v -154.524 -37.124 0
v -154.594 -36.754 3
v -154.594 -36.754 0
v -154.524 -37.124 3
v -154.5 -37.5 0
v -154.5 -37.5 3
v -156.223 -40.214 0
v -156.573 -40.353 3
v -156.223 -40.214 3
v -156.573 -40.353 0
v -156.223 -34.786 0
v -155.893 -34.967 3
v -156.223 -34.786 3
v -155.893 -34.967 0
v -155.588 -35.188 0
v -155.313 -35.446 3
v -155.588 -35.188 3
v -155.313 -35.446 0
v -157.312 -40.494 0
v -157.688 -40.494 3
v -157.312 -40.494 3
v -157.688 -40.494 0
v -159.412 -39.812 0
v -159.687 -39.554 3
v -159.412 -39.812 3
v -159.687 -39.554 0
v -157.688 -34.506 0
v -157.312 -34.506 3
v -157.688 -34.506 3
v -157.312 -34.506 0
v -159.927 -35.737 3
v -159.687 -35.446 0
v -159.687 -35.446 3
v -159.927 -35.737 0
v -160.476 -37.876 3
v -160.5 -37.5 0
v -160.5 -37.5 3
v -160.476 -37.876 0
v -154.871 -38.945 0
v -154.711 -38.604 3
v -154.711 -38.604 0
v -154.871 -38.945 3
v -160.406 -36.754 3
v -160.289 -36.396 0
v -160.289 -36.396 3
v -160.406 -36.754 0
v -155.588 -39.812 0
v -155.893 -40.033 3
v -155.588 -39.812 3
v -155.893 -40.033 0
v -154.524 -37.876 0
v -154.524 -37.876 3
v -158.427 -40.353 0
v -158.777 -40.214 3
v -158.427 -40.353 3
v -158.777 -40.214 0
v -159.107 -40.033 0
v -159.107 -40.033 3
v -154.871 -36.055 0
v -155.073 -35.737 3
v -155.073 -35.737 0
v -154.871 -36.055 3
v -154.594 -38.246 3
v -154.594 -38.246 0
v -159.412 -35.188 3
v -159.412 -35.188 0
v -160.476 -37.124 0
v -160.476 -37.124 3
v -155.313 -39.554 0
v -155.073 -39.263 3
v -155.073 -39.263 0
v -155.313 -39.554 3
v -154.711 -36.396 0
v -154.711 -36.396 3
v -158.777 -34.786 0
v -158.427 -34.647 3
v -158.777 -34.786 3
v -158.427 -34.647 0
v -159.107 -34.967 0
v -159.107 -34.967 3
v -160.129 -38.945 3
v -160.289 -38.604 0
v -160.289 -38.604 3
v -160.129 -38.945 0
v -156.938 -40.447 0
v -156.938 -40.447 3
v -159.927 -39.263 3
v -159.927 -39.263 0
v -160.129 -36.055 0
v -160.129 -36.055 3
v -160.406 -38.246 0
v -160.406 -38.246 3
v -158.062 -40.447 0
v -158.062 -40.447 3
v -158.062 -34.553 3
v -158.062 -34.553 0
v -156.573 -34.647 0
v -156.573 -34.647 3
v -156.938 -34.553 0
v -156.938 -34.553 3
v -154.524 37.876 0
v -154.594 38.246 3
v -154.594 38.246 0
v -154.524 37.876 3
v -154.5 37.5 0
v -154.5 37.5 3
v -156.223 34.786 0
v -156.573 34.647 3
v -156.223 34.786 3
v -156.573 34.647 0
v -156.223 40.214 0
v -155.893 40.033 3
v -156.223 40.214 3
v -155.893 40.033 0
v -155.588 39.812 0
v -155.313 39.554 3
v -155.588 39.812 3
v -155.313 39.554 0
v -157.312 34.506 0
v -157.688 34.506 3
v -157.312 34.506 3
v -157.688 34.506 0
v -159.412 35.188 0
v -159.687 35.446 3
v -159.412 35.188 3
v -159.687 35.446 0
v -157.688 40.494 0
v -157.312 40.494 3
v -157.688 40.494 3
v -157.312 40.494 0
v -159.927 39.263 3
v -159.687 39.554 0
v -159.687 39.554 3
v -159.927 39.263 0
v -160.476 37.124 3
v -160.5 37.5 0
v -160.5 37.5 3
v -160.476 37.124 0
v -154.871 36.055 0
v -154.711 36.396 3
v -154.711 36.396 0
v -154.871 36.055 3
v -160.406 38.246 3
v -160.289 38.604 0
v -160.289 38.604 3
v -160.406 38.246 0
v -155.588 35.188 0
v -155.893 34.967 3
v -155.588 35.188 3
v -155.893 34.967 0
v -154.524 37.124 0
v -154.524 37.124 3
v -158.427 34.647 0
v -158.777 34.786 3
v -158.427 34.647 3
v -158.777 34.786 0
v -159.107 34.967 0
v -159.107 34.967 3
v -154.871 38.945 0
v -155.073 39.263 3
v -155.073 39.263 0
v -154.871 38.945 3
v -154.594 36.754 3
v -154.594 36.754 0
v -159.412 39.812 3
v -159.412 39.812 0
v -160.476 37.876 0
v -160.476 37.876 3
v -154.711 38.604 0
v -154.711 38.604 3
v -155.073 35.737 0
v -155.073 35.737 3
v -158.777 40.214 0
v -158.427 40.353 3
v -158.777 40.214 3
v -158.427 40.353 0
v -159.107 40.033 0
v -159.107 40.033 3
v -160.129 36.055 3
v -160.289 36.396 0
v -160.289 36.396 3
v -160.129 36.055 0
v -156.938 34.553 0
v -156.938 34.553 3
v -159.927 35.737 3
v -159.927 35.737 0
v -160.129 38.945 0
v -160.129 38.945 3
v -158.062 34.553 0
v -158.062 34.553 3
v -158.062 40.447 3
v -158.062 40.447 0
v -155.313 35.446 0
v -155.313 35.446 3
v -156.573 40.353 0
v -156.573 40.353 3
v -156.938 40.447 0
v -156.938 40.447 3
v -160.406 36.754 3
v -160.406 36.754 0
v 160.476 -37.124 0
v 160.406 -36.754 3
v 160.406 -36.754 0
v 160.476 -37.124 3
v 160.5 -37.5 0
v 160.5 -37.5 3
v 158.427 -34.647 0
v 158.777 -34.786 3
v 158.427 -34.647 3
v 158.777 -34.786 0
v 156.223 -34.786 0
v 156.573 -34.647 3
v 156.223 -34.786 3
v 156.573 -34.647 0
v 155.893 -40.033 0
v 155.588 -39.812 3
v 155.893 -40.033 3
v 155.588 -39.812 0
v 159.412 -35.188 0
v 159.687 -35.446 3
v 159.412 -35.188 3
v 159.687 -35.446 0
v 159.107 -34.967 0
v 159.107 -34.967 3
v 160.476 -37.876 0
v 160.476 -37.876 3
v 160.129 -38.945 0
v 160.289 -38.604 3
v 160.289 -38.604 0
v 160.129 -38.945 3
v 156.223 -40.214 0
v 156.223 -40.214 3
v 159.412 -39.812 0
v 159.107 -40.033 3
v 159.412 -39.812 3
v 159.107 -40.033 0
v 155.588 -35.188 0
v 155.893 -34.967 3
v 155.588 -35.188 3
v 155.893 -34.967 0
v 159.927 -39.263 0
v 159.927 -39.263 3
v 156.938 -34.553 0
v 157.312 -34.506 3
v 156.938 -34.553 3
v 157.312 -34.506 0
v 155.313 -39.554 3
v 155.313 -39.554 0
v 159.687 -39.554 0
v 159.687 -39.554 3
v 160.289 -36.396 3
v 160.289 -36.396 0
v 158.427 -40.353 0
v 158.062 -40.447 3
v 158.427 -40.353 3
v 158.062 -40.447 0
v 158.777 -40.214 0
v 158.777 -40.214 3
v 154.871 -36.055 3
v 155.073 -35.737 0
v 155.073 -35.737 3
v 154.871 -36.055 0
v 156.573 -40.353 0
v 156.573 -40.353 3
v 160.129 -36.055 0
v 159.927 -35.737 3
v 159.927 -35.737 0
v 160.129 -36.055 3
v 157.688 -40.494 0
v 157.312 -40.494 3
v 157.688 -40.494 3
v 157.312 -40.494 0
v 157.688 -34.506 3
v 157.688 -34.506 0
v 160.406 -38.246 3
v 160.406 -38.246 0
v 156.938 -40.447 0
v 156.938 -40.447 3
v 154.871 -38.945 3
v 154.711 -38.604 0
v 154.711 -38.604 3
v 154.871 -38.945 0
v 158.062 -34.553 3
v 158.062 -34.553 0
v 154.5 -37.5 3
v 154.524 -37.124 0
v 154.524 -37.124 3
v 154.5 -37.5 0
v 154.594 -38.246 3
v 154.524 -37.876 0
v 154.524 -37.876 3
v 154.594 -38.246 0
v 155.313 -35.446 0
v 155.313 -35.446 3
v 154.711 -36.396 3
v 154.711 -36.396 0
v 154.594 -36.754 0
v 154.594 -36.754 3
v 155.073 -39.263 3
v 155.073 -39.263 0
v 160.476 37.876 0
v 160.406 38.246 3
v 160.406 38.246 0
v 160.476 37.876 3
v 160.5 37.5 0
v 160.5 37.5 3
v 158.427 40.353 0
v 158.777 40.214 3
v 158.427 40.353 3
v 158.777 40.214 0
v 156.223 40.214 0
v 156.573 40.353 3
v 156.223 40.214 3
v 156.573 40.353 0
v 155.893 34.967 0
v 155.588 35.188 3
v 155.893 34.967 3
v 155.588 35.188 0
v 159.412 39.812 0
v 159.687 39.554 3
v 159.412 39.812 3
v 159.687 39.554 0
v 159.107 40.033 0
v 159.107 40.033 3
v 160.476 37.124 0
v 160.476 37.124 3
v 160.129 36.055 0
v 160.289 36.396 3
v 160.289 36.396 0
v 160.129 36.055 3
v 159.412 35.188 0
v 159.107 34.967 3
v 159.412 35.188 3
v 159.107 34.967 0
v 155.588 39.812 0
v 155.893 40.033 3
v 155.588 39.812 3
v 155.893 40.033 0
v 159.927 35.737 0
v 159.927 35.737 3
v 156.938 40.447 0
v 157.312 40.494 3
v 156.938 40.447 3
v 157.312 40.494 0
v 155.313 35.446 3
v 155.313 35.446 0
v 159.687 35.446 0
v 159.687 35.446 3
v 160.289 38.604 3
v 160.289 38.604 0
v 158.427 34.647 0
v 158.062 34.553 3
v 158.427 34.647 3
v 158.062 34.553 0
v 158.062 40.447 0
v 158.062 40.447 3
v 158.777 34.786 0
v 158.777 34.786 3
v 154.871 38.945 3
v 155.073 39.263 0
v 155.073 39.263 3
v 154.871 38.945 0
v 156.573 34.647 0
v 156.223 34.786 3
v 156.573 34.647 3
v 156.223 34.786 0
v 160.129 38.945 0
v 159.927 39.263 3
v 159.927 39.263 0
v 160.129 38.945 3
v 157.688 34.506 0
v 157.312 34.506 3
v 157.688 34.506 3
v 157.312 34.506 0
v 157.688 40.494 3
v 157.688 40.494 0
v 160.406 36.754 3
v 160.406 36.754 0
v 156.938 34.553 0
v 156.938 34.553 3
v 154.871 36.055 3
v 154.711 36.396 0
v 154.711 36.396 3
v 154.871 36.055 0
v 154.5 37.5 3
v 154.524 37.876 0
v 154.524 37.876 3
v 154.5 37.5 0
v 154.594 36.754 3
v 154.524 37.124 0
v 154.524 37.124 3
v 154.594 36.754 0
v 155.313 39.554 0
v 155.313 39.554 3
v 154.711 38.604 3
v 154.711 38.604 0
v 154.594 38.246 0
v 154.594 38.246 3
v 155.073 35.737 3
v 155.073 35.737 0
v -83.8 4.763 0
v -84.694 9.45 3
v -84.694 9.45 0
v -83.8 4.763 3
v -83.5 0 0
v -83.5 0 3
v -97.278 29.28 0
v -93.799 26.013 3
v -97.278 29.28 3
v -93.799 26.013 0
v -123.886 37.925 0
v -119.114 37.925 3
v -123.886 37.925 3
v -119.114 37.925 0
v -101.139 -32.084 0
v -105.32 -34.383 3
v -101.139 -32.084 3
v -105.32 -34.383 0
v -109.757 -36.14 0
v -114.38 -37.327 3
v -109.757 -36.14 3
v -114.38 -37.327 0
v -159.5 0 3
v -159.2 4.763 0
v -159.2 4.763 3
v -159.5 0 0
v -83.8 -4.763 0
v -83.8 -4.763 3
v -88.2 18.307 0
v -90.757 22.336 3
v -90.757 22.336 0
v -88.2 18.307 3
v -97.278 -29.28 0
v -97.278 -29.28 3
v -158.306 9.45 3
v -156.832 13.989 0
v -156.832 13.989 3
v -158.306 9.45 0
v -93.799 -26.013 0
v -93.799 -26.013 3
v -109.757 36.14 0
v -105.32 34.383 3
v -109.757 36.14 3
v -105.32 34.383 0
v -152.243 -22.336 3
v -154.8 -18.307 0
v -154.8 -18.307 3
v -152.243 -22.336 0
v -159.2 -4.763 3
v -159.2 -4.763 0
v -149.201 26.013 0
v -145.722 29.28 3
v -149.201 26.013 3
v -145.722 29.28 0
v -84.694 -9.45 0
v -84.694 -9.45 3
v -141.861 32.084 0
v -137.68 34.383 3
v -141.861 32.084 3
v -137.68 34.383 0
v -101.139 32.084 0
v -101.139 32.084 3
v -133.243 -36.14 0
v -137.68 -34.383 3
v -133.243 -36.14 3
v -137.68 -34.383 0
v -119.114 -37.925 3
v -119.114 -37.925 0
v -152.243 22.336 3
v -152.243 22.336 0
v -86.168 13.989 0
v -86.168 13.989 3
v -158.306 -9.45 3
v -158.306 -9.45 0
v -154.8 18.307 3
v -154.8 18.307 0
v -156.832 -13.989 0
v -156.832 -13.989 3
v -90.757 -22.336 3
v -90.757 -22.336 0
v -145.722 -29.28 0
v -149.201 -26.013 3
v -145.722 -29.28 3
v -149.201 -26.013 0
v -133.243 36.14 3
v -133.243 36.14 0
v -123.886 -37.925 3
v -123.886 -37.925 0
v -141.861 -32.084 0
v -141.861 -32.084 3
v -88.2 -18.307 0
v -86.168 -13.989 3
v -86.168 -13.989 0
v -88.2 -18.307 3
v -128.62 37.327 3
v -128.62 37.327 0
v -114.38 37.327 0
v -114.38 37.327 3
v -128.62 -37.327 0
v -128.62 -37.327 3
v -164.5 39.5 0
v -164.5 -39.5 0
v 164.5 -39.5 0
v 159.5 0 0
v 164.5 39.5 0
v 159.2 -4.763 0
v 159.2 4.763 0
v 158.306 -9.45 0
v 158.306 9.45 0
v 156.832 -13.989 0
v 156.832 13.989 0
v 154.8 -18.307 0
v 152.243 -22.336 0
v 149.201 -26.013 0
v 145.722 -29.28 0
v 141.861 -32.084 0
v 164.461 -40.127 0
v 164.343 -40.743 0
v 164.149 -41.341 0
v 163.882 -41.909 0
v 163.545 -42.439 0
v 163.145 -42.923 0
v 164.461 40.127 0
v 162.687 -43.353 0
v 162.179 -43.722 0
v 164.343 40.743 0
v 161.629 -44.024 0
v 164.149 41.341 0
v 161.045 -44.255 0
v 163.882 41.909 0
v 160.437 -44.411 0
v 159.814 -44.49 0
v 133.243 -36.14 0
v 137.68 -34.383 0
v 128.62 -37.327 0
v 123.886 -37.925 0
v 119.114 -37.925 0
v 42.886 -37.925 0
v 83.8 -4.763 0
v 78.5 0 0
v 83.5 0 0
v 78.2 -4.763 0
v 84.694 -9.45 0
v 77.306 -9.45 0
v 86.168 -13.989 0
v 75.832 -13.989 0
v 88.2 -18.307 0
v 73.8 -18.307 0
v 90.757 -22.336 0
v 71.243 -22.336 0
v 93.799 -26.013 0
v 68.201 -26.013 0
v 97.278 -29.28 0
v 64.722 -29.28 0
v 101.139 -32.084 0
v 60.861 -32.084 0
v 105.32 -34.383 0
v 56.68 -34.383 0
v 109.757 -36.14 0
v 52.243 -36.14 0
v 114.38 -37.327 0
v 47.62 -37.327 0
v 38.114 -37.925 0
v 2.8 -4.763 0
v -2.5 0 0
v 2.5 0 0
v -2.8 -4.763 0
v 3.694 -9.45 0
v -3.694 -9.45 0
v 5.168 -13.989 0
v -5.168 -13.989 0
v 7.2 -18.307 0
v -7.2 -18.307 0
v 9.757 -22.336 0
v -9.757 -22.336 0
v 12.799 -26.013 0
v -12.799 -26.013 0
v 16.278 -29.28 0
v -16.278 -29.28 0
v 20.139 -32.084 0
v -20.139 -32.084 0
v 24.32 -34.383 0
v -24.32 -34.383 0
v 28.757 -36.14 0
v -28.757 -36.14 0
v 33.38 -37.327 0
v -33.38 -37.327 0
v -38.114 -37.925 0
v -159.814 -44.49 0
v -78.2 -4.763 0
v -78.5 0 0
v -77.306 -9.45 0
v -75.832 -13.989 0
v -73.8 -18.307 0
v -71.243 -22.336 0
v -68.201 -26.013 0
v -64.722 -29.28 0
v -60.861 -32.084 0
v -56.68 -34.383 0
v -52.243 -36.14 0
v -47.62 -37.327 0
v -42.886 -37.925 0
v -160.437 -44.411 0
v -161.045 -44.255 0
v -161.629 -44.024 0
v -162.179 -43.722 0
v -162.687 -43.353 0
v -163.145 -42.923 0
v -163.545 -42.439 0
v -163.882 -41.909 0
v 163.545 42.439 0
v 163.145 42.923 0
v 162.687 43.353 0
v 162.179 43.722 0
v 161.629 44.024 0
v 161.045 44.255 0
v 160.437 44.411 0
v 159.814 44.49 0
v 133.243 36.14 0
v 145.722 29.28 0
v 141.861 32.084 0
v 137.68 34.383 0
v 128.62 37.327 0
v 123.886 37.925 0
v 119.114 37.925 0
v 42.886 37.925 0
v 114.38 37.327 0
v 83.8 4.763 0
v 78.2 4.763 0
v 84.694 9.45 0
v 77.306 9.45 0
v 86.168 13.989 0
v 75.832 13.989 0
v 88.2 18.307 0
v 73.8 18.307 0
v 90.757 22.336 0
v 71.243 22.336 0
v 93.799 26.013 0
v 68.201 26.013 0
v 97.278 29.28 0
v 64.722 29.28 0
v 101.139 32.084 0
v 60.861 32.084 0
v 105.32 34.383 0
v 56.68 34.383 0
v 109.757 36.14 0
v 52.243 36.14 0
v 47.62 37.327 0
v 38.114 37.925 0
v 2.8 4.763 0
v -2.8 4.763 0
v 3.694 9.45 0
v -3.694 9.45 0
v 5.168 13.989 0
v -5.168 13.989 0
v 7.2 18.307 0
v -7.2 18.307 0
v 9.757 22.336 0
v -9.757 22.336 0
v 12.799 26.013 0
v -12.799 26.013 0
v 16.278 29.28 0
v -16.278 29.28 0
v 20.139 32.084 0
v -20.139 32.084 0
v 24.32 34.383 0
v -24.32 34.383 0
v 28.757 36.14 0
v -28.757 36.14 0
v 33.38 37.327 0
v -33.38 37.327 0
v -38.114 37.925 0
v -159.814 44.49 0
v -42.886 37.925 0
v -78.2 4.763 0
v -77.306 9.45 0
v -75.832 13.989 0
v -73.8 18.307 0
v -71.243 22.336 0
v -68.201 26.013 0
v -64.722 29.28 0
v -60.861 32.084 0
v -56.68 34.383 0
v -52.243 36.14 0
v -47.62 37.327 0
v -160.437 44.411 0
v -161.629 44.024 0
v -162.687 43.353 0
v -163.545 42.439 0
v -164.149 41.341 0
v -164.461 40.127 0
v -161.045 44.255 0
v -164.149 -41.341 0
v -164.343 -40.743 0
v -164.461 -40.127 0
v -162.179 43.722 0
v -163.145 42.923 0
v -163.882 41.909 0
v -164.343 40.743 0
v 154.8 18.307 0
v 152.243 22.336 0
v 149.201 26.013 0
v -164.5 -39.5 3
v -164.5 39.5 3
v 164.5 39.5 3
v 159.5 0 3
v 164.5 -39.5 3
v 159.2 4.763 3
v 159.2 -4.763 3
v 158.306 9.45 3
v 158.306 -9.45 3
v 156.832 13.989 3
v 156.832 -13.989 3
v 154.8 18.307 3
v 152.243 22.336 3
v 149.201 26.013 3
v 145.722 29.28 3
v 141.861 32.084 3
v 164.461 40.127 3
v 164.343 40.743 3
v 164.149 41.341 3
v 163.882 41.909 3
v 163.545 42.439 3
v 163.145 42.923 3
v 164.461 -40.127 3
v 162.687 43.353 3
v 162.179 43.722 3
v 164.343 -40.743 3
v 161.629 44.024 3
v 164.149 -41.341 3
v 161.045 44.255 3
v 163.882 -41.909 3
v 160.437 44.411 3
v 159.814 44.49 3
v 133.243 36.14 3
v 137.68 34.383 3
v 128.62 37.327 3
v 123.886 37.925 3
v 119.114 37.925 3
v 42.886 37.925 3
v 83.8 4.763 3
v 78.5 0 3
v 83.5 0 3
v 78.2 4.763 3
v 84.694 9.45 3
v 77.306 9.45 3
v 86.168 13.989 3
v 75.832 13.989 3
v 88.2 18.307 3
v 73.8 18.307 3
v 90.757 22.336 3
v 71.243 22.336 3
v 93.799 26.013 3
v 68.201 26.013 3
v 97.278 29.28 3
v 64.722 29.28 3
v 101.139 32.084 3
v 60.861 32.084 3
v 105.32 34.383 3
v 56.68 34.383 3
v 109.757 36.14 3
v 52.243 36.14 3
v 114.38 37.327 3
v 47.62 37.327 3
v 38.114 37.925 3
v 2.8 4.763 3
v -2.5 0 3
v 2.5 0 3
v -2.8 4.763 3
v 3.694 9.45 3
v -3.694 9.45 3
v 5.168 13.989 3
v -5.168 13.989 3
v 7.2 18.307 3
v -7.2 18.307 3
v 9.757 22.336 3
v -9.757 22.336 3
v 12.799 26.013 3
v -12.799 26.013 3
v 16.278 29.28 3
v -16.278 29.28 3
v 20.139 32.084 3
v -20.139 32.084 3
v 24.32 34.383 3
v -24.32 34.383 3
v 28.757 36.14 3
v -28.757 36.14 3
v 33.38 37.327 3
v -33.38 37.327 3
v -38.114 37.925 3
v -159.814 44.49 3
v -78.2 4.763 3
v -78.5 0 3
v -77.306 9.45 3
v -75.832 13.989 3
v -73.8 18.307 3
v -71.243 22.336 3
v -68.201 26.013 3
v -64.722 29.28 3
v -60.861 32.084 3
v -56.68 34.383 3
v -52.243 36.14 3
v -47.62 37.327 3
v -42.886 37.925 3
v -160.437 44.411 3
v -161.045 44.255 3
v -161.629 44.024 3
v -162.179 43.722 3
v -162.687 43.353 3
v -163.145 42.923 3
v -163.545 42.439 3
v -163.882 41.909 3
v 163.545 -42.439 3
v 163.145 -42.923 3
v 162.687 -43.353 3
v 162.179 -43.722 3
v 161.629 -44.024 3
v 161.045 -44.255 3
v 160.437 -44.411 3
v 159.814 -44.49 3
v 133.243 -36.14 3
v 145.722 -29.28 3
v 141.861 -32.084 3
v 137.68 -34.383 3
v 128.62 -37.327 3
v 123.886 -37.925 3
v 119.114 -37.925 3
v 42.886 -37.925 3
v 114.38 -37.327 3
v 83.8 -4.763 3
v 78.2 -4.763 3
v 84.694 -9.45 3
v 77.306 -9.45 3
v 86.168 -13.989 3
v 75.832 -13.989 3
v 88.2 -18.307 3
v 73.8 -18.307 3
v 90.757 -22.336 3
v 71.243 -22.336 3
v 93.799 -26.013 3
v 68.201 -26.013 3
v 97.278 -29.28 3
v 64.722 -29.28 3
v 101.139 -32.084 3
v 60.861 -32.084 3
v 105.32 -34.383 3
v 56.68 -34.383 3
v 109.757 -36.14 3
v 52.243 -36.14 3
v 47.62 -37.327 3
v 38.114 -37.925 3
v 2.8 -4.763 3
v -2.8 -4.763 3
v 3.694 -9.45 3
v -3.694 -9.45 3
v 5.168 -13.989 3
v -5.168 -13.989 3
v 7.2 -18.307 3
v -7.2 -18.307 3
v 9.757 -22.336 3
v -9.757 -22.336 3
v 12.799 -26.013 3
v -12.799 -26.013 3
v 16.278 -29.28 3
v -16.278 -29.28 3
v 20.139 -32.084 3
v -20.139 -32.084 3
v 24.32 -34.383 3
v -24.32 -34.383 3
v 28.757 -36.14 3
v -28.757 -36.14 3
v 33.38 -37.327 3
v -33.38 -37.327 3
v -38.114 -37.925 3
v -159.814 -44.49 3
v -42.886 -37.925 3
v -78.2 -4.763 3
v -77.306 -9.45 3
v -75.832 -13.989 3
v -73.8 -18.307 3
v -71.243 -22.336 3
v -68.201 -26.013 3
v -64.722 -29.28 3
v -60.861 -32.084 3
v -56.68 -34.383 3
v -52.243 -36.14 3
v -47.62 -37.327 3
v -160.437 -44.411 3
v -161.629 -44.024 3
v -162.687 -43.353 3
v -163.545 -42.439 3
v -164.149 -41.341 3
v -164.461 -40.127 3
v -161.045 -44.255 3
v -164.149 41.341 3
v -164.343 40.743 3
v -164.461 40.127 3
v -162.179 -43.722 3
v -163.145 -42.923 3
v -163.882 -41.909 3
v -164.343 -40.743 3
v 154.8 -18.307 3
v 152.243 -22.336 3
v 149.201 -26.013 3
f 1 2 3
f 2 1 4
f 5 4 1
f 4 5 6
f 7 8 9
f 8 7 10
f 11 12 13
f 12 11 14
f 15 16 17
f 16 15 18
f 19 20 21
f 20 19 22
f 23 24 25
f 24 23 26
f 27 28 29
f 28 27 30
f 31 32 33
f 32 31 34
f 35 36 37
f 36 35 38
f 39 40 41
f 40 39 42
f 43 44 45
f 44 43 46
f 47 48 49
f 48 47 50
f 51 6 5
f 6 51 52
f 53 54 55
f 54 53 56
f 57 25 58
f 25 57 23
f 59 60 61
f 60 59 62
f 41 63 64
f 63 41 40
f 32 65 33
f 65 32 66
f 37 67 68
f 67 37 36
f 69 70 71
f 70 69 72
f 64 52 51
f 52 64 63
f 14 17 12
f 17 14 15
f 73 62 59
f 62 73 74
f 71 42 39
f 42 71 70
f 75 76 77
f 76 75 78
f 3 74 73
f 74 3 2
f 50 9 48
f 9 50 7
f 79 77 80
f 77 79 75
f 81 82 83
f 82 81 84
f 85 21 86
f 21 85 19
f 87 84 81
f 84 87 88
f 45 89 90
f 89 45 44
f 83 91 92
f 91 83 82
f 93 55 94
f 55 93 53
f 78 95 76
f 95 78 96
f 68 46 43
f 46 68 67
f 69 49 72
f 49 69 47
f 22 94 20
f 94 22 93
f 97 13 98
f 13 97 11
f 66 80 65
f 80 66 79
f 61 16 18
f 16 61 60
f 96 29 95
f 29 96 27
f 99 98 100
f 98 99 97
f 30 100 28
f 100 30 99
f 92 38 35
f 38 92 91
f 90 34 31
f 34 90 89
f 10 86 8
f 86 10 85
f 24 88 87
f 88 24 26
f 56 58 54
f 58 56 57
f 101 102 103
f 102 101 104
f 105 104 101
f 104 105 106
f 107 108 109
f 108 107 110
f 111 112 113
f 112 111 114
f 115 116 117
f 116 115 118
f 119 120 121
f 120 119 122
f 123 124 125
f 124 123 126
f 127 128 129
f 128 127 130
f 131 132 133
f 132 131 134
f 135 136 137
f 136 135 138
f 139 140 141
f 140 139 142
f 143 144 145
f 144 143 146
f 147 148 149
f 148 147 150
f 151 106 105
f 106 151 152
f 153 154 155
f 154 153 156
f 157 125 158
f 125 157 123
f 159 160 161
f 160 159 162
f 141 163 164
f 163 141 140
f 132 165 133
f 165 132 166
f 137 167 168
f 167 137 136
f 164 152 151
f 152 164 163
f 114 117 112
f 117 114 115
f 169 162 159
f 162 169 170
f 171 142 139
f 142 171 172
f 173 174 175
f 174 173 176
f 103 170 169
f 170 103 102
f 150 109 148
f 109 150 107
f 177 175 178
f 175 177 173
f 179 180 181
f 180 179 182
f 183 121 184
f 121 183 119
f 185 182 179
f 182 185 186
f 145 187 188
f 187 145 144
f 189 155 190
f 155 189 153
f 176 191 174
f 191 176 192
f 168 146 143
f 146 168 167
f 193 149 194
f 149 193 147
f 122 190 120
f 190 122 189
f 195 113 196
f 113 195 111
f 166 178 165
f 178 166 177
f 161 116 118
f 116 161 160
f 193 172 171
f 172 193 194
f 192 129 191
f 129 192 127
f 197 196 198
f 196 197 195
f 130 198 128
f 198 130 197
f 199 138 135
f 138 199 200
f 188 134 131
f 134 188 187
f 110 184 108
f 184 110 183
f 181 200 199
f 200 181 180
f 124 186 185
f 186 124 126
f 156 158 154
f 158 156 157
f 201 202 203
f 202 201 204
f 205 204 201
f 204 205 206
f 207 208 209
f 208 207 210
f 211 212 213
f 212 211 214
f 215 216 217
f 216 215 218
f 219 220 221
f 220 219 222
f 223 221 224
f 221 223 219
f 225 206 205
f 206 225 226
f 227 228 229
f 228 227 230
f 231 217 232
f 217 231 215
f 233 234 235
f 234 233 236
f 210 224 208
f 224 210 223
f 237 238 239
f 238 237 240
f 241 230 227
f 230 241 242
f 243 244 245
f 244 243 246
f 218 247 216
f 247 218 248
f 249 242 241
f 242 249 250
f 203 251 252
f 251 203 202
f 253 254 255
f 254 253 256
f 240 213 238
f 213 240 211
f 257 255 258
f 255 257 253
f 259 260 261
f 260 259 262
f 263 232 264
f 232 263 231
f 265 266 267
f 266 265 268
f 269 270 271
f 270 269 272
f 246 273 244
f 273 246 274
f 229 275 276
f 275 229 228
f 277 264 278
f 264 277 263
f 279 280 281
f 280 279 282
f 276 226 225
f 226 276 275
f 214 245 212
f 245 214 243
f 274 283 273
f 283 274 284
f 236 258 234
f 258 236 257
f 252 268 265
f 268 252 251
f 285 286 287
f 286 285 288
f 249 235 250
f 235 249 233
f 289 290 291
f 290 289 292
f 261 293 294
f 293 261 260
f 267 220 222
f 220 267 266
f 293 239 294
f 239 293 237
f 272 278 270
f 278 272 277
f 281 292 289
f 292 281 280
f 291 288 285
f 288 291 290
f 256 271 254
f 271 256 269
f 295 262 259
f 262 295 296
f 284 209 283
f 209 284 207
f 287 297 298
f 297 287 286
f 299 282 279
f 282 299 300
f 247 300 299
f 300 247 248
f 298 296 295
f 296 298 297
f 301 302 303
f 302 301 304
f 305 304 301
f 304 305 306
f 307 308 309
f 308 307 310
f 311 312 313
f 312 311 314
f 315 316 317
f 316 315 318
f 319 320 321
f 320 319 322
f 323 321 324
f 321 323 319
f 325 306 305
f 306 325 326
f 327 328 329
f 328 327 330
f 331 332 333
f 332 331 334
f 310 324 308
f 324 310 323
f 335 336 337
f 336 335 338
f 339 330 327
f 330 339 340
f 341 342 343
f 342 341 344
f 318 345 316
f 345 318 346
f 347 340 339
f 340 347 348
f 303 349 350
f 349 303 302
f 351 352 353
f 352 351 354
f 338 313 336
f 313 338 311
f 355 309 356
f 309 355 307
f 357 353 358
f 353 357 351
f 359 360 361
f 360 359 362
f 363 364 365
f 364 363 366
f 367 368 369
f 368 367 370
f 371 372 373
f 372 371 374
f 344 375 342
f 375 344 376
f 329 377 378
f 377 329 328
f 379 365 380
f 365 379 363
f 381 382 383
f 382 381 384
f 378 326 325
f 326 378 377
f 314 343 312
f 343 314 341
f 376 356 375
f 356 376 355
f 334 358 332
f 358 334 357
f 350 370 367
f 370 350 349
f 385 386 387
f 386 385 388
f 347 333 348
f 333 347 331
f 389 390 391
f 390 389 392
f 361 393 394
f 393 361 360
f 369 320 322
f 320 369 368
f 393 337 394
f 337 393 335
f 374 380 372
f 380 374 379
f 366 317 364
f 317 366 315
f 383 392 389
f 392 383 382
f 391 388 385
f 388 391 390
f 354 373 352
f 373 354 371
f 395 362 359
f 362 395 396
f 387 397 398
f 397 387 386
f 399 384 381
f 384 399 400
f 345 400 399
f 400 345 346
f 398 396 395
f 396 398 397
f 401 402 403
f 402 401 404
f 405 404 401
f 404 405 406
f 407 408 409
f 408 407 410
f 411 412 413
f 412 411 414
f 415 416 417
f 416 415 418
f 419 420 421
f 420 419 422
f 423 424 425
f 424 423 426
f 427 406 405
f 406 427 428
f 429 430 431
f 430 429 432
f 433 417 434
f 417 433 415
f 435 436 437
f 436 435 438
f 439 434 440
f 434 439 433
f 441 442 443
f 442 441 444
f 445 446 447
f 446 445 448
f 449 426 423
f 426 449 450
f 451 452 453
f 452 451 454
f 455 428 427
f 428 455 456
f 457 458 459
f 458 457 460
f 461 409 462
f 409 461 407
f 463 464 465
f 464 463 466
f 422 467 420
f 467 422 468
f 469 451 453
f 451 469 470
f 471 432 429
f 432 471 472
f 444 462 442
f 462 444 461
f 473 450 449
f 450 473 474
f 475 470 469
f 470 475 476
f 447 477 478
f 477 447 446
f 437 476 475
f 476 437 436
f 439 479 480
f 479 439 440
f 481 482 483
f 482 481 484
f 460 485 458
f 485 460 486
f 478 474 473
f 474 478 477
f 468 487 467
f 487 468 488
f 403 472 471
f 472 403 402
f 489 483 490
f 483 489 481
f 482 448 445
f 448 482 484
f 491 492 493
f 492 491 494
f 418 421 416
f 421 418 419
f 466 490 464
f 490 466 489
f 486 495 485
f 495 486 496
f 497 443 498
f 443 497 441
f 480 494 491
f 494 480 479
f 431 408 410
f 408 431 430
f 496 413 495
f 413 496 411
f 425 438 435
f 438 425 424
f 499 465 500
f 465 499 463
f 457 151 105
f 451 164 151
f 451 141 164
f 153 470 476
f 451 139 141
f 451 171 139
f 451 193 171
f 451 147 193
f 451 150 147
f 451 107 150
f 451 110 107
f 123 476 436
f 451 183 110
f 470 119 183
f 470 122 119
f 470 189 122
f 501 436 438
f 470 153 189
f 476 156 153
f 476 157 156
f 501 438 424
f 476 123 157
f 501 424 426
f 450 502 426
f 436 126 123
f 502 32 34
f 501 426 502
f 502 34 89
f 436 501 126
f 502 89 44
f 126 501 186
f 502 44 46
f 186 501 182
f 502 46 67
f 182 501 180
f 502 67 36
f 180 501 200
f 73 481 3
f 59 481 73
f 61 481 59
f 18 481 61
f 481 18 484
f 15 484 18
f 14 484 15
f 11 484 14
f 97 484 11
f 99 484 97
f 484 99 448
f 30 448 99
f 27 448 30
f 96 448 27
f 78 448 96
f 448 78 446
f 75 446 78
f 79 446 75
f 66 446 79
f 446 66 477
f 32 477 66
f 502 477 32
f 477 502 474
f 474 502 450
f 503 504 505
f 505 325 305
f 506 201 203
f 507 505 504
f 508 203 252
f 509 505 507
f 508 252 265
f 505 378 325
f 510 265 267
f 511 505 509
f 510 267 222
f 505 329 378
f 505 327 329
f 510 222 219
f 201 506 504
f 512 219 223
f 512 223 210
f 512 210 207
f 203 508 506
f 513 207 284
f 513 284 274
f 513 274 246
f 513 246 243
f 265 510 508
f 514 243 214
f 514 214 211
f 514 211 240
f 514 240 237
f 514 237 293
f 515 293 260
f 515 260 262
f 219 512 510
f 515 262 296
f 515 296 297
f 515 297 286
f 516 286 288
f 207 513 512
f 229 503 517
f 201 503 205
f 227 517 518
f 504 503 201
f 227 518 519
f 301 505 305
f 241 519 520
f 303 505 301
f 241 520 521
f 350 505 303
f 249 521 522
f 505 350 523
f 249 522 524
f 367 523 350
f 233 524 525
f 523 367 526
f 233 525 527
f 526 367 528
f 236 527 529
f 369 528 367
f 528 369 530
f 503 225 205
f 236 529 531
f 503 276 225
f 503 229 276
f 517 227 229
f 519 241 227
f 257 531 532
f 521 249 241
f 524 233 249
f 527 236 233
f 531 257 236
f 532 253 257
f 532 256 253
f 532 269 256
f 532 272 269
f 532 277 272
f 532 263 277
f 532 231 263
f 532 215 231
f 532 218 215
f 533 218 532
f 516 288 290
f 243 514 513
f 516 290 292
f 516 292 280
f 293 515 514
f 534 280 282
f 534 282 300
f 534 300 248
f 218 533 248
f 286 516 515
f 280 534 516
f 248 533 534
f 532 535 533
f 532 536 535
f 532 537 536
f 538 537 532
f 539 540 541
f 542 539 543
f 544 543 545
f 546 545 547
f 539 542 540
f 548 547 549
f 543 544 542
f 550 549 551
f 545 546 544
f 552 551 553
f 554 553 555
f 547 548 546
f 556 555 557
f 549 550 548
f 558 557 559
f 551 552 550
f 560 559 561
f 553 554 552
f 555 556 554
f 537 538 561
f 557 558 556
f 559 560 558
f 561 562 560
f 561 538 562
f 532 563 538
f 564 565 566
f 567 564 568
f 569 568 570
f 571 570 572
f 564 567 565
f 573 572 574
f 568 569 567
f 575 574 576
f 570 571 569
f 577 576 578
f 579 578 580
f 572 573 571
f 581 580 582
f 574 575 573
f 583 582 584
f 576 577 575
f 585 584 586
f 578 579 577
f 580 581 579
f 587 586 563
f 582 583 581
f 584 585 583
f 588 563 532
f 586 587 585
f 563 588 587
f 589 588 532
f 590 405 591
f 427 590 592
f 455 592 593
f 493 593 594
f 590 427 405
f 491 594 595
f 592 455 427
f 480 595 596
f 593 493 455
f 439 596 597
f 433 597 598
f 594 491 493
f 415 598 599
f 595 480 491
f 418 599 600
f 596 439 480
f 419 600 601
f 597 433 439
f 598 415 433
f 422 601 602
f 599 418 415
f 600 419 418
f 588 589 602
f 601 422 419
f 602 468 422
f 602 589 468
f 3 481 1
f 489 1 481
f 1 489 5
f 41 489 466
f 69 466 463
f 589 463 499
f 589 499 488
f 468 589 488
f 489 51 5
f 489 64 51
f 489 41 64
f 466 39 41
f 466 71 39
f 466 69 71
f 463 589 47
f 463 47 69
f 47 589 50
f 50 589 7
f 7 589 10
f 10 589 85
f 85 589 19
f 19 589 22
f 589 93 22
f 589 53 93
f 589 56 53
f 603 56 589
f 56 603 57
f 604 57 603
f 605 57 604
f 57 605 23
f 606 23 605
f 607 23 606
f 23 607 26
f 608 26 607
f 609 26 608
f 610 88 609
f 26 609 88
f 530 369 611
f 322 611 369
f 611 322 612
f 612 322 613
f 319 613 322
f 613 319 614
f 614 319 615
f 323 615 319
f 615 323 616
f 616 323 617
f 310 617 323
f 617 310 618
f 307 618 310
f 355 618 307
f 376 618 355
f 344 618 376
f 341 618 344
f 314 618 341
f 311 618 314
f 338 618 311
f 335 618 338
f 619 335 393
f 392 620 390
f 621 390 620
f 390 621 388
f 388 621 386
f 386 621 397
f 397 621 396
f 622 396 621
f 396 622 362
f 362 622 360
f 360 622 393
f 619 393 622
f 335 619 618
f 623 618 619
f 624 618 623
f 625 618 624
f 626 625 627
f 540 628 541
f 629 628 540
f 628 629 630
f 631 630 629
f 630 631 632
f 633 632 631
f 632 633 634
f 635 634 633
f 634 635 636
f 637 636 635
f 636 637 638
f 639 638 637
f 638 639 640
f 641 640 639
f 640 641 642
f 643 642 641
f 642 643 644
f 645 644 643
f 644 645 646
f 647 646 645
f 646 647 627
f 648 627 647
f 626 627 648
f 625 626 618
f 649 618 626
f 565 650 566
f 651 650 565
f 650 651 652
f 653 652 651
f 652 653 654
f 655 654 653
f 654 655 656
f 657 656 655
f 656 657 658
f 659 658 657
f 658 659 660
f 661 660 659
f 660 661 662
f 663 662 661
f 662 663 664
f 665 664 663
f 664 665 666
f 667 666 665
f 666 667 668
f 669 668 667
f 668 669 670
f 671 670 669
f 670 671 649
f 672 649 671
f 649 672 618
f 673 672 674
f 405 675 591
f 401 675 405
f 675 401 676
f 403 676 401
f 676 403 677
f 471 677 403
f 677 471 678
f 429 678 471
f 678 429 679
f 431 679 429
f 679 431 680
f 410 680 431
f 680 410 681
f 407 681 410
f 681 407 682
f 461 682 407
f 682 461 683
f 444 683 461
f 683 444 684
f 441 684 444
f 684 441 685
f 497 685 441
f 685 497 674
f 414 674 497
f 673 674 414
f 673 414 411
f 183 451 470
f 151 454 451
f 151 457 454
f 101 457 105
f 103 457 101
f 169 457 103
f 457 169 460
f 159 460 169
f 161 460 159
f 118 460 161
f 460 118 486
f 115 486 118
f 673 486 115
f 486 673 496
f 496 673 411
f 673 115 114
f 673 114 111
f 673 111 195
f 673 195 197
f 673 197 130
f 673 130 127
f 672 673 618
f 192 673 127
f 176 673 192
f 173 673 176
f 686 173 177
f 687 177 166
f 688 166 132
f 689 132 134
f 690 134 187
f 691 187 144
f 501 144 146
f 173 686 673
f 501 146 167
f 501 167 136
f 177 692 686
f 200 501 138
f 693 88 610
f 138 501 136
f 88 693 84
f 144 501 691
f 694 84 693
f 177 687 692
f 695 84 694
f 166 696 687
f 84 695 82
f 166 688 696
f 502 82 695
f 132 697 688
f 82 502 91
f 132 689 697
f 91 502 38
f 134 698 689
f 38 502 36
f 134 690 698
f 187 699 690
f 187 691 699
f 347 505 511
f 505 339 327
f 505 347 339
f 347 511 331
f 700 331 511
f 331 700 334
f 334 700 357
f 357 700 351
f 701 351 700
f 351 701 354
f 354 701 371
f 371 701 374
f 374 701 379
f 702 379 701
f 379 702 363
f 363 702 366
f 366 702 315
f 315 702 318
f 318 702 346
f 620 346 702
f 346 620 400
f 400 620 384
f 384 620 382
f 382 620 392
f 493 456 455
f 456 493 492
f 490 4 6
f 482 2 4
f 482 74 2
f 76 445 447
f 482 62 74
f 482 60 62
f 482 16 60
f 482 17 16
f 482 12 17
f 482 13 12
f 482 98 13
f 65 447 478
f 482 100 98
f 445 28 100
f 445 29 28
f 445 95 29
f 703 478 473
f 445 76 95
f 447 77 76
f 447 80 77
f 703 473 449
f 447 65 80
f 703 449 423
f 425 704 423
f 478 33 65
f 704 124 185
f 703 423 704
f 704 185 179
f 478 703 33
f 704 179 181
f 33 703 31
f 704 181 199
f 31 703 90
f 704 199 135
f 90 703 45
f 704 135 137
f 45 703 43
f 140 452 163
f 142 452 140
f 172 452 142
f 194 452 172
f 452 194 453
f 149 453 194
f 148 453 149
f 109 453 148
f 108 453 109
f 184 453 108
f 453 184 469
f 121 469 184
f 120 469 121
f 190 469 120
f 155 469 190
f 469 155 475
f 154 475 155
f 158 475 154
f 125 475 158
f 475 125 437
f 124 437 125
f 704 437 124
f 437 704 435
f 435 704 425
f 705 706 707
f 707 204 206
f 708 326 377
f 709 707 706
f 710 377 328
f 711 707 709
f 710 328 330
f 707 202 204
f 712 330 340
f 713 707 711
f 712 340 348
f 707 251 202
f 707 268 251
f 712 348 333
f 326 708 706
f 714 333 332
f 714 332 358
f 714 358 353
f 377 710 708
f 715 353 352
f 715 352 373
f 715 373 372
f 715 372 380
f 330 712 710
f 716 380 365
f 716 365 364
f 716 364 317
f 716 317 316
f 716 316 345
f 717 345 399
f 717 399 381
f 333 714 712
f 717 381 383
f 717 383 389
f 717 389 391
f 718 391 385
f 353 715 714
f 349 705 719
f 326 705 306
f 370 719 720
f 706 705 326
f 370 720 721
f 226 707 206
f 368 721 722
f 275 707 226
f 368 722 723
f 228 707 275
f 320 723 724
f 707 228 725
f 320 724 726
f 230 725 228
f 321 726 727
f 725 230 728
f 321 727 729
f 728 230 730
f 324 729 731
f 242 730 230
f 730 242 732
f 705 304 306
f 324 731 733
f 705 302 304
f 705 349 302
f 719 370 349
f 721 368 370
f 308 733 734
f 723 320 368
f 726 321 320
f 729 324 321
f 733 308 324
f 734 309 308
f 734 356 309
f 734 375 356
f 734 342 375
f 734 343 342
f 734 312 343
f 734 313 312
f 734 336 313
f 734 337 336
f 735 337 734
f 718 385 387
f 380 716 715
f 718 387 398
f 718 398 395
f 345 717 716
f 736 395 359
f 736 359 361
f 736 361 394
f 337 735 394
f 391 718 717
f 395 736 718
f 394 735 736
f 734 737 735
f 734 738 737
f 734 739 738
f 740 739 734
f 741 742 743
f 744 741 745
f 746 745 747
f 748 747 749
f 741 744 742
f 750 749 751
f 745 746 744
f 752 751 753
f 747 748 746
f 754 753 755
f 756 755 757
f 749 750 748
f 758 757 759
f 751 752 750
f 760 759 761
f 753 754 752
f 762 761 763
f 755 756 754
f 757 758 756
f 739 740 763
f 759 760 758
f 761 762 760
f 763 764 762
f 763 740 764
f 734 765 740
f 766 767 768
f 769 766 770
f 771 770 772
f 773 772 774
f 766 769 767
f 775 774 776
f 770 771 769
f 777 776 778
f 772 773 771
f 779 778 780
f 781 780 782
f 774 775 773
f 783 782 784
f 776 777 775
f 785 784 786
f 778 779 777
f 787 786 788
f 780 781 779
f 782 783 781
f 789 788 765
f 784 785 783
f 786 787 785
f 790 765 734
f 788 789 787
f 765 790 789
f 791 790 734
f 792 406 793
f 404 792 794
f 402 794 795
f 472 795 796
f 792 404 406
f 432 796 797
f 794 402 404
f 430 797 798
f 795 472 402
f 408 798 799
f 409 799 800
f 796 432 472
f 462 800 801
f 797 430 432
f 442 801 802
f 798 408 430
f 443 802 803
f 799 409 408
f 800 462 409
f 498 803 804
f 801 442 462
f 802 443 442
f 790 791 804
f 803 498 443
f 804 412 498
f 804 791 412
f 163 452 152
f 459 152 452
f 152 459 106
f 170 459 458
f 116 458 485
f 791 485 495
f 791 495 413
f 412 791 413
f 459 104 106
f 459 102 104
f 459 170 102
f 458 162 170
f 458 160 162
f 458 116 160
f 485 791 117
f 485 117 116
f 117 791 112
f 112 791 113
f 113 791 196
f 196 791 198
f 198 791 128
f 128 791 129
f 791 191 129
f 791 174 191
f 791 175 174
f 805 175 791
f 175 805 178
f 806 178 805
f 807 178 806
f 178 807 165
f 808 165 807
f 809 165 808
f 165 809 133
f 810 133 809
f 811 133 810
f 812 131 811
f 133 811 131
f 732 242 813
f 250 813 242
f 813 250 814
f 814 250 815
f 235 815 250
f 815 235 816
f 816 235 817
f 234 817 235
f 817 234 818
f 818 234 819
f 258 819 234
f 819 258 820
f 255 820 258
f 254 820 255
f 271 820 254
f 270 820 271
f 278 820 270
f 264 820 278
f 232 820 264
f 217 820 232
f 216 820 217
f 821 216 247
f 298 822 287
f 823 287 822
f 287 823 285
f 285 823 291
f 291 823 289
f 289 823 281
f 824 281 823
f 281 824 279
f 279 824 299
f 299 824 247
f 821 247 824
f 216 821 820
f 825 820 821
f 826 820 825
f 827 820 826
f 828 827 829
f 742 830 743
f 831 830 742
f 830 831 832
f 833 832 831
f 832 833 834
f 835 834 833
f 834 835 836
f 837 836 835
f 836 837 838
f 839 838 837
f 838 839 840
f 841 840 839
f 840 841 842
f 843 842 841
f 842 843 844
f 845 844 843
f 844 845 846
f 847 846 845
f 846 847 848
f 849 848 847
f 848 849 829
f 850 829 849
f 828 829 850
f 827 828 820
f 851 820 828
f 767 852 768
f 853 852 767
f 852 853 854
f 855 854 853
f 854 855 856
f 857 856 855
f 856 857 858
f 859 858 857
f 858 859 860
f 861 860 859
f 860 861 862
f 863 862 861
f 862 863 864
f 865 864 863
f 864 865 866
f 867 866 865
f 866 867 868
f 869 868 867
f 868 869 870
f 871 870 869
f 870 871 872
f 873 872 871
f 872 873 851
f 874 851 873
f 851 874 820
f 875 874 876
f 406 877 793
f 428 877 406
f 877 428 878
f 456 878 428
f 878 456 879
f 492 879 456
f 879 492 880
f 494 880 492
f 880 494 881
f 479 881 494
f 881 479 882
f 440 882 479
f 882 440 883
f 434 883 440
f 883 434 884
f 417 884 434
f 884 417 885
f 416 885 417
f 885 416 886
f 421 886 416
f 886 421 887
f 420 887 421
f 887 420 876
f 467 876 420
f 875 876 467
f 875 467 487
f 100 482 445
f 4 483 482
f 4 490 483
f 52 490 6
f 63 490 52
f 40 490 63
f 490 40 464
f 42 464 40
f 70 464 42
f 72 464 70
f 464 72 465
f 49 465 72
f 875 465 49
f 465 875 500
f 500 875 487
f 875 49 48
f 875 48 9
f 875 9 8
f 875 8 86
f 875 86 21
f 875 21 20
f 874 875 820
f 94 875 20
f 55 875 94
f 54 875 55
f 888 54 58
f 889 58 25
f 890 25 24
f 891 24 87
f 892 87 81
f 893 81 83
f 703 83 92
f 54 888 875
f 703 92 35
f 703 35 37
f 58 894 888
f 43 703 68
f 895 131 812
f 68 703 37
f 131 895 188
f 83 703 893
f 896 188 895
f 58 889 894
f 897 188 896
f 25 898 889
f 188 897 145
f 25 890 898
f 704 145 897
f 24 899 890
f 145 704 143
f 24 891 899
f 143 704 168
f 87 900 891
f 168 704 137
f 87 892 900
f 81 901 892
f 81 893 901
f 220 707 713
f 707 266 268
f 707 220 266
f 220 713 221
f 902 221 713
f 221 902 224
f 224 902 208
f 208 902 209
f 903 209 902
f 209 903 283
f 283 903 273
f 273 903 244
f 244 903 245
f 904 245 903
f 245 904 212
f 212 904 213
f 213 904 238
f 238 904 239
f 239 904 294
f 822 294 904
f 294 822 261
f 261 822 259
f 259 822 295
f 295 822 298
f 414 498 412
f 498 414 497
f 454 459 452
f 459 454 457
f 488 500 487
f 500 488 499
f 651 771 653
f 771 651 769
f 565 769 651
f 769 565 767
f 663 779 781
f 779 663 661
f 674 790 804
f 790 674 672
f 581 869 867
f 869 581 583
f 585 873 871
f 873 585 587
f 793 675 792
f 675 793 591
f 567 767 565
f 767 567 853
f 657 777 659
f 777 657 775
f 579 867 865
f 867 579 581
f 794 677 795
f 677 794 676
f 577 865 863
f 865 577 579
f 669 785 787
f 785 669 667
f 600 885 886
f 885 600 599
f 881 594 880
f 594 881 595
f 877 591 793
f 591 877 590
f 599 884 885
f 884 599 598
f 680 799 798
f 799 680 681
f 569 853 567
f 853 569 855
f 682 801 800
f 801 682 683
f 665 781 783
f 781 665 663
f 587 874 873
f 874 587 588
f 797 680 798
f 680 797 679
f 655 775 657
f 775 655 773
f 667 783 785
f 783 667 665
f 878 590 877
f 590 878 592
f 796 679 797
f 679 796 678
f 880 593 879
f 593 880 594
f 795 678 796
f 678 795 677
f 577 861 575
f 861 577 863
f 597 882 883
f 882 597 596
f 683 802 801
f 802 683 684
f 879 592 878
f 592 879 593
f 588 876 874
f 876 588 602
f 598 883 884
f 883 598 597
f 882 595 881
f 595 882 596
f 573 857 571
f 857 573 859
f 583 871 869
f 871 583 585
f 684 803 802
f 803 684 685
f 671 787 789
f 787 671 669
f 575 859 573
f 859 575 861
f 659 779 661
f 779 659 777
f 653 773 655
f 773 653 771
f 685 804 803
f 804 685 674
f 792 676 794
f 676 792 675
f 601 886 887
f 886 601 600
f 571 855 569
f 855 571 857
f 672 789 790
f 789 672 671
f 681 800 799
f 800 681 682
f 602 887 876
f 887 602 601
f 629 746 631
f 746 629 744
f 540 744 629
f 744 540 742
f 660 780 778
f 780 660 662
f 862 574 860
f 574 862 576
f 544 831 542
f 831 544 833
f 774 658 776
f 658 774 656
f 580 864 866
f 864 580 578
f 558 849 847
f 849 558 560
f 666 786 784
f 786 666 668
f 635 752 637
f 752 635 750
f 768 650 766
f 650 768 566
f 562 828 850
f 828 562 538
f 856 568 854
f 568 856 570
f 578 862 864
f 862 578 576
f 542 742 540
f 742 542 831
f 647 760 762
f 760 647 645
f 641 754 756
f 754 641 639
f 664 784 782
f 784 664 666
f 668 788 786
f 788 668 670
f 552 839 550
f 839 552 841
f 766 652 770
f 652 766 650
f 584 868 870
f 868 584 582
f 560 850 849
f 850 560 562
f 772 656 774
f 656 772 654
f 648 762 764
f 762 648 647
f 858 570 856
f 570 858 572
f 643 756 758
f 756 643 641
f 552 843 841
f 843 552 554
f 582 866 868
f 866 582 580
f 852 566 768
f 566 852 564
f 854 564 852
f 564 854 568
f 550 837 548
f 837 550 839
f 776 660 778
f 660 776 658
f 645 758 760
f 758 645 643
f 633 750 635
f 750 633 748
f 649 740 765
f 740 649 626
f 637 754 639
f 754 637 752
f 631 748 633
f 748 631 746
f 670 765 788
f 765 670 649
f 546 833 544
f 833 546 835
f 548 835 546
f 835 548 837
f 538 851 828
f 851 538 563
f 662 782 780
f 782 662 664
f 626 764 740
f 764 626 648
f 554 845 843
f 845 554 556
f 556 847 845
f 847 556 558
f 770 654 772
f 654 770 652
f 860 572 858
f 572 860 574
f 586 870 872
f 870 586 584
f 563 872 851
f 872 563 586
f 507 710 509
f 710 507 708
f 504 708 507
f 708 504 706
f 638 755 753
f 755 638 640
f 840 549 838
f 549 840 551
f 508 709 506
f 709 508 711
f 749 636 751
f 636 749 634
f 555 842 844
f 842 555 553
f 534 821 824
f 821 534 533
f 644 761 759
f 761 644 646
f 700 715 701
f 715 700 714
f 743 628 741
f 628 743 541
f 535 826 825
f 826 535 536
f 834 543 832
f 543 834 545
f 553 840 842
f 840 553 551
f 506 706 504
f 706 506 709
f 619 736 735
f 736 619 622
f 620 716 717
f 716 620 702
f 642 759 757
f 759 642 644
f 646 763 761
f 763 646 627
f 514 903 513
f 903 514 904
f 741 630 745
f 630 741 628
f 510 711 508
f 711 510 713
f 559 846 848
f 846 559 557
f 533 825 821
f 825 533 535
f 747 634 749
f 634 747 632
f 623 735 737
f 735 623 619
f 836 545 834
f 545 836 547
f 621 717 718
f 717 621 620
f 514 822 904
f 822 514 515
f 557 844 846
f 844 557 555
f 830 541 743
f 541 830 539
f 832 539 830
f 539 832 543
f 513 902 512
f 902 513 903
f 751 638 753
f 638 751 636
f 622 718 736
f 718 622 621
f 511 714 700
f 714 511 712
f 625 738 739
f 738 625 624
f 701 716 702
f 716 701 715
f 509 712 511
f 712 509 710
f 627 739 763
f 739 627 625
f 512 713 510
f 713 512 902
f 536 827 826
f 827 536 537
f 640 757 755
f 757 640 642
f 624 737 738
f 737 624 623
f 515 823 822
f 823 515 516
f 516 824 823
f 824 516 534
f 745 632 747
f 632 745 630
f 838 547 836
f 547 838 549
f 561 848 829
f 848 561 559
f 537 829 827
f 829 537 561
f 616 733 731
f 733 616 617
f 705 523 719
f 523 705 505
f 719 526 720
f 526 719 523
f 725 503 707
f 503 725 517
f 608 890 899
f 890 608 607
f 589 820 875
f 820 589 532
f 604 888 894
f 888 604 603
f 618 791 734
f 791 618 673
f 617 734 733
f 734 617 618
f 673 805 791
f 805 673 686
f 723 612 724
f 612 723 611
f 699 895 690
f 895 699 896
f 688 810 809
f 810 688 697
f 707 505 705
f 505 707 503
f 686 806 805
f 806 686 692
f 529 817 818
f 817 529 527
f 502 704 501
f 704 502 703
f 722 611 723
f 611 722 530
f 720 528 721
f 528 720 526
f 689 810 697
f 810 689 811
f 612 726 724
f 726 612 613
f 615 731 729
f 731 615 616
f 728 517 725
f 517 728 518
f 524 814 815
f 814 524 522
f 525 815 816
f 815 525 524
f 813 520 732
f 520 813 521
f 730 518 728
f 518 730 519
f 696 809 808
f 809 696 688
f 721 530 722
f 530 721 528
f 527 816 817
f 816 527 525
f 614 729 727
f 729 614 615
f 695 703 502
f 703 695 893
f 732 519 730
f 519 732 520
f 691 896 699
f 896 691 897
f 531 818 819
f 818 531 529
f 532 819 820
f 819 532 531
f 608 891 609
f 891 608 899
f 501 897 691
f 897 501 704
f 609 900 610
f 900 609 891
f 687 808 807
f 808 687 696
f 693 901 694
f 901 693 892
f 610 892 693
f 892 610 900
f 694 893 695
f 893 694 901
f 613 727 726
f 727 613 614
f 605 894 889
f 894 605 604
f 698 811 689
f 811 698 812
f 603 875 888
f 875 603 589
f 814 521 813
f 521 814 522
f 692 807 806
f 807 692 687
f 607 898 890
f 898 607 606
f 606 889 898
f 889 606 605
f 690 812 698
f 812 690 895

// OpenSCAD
$fn = 50;


difference() {
	union() {
		hull() {
			translate(v = [-159.5000000000, 39.5000000000, 0]) {
				cylinder(h = 3, r = 5);
			}
			translate(v = [159.5000000000, 39.5000000000, 0]) {
				cylinder(h = 3, r = 5);
			}
			translate(v = [-159.5000000000, -39.5000000000, 0]) {
				cylinder(h = 3, r = 5);
			}
			translate(v = [159.5000000000, -39.5000000000, 0]) {
				cylinder(h = 3, r = 5);
			}
		}
	}
	union() {
		#translate(v = [-157.5000000000, -37.5000000000, -100.0000000000]) {
			cylinder(h = 200, r = 3.0000000000);
		}
		#translate(v = [-157.5000000000, 37.5000000000, -100.0000000000]) {
			cylinder(h = 200, r = 3.0000000000);
		}
		#translate(v = [157.5000000000, -37.5000000000, -100.0000000000]) {
			cylinder(h = 200, r = 3.0000000000);
		}
		#translate(v = [157.5000000000, 37.5000000000, -100.0000000000]) {
			cylinder(h = 200, r = 3.0000000000);
		}
		#translate(v = [-121.5000000000, 0, 0]) {
			cylinder(h = 3, r = 38.0000000000);
		}
		#translate(v = [-40.5000000000, 0, 0]) {
			cylinder(h = 3, r = 38.0000000000);
		}
		#translate(v = [40.5000000000, 0, 0]) {
			cylinder(h = 3, r = 38.0000000000);
		}
		#translate(v = [121.5000000000, 0, 0]) {
			cylinder(h = 3, r = 38.0000000000);
		}
	}
}
